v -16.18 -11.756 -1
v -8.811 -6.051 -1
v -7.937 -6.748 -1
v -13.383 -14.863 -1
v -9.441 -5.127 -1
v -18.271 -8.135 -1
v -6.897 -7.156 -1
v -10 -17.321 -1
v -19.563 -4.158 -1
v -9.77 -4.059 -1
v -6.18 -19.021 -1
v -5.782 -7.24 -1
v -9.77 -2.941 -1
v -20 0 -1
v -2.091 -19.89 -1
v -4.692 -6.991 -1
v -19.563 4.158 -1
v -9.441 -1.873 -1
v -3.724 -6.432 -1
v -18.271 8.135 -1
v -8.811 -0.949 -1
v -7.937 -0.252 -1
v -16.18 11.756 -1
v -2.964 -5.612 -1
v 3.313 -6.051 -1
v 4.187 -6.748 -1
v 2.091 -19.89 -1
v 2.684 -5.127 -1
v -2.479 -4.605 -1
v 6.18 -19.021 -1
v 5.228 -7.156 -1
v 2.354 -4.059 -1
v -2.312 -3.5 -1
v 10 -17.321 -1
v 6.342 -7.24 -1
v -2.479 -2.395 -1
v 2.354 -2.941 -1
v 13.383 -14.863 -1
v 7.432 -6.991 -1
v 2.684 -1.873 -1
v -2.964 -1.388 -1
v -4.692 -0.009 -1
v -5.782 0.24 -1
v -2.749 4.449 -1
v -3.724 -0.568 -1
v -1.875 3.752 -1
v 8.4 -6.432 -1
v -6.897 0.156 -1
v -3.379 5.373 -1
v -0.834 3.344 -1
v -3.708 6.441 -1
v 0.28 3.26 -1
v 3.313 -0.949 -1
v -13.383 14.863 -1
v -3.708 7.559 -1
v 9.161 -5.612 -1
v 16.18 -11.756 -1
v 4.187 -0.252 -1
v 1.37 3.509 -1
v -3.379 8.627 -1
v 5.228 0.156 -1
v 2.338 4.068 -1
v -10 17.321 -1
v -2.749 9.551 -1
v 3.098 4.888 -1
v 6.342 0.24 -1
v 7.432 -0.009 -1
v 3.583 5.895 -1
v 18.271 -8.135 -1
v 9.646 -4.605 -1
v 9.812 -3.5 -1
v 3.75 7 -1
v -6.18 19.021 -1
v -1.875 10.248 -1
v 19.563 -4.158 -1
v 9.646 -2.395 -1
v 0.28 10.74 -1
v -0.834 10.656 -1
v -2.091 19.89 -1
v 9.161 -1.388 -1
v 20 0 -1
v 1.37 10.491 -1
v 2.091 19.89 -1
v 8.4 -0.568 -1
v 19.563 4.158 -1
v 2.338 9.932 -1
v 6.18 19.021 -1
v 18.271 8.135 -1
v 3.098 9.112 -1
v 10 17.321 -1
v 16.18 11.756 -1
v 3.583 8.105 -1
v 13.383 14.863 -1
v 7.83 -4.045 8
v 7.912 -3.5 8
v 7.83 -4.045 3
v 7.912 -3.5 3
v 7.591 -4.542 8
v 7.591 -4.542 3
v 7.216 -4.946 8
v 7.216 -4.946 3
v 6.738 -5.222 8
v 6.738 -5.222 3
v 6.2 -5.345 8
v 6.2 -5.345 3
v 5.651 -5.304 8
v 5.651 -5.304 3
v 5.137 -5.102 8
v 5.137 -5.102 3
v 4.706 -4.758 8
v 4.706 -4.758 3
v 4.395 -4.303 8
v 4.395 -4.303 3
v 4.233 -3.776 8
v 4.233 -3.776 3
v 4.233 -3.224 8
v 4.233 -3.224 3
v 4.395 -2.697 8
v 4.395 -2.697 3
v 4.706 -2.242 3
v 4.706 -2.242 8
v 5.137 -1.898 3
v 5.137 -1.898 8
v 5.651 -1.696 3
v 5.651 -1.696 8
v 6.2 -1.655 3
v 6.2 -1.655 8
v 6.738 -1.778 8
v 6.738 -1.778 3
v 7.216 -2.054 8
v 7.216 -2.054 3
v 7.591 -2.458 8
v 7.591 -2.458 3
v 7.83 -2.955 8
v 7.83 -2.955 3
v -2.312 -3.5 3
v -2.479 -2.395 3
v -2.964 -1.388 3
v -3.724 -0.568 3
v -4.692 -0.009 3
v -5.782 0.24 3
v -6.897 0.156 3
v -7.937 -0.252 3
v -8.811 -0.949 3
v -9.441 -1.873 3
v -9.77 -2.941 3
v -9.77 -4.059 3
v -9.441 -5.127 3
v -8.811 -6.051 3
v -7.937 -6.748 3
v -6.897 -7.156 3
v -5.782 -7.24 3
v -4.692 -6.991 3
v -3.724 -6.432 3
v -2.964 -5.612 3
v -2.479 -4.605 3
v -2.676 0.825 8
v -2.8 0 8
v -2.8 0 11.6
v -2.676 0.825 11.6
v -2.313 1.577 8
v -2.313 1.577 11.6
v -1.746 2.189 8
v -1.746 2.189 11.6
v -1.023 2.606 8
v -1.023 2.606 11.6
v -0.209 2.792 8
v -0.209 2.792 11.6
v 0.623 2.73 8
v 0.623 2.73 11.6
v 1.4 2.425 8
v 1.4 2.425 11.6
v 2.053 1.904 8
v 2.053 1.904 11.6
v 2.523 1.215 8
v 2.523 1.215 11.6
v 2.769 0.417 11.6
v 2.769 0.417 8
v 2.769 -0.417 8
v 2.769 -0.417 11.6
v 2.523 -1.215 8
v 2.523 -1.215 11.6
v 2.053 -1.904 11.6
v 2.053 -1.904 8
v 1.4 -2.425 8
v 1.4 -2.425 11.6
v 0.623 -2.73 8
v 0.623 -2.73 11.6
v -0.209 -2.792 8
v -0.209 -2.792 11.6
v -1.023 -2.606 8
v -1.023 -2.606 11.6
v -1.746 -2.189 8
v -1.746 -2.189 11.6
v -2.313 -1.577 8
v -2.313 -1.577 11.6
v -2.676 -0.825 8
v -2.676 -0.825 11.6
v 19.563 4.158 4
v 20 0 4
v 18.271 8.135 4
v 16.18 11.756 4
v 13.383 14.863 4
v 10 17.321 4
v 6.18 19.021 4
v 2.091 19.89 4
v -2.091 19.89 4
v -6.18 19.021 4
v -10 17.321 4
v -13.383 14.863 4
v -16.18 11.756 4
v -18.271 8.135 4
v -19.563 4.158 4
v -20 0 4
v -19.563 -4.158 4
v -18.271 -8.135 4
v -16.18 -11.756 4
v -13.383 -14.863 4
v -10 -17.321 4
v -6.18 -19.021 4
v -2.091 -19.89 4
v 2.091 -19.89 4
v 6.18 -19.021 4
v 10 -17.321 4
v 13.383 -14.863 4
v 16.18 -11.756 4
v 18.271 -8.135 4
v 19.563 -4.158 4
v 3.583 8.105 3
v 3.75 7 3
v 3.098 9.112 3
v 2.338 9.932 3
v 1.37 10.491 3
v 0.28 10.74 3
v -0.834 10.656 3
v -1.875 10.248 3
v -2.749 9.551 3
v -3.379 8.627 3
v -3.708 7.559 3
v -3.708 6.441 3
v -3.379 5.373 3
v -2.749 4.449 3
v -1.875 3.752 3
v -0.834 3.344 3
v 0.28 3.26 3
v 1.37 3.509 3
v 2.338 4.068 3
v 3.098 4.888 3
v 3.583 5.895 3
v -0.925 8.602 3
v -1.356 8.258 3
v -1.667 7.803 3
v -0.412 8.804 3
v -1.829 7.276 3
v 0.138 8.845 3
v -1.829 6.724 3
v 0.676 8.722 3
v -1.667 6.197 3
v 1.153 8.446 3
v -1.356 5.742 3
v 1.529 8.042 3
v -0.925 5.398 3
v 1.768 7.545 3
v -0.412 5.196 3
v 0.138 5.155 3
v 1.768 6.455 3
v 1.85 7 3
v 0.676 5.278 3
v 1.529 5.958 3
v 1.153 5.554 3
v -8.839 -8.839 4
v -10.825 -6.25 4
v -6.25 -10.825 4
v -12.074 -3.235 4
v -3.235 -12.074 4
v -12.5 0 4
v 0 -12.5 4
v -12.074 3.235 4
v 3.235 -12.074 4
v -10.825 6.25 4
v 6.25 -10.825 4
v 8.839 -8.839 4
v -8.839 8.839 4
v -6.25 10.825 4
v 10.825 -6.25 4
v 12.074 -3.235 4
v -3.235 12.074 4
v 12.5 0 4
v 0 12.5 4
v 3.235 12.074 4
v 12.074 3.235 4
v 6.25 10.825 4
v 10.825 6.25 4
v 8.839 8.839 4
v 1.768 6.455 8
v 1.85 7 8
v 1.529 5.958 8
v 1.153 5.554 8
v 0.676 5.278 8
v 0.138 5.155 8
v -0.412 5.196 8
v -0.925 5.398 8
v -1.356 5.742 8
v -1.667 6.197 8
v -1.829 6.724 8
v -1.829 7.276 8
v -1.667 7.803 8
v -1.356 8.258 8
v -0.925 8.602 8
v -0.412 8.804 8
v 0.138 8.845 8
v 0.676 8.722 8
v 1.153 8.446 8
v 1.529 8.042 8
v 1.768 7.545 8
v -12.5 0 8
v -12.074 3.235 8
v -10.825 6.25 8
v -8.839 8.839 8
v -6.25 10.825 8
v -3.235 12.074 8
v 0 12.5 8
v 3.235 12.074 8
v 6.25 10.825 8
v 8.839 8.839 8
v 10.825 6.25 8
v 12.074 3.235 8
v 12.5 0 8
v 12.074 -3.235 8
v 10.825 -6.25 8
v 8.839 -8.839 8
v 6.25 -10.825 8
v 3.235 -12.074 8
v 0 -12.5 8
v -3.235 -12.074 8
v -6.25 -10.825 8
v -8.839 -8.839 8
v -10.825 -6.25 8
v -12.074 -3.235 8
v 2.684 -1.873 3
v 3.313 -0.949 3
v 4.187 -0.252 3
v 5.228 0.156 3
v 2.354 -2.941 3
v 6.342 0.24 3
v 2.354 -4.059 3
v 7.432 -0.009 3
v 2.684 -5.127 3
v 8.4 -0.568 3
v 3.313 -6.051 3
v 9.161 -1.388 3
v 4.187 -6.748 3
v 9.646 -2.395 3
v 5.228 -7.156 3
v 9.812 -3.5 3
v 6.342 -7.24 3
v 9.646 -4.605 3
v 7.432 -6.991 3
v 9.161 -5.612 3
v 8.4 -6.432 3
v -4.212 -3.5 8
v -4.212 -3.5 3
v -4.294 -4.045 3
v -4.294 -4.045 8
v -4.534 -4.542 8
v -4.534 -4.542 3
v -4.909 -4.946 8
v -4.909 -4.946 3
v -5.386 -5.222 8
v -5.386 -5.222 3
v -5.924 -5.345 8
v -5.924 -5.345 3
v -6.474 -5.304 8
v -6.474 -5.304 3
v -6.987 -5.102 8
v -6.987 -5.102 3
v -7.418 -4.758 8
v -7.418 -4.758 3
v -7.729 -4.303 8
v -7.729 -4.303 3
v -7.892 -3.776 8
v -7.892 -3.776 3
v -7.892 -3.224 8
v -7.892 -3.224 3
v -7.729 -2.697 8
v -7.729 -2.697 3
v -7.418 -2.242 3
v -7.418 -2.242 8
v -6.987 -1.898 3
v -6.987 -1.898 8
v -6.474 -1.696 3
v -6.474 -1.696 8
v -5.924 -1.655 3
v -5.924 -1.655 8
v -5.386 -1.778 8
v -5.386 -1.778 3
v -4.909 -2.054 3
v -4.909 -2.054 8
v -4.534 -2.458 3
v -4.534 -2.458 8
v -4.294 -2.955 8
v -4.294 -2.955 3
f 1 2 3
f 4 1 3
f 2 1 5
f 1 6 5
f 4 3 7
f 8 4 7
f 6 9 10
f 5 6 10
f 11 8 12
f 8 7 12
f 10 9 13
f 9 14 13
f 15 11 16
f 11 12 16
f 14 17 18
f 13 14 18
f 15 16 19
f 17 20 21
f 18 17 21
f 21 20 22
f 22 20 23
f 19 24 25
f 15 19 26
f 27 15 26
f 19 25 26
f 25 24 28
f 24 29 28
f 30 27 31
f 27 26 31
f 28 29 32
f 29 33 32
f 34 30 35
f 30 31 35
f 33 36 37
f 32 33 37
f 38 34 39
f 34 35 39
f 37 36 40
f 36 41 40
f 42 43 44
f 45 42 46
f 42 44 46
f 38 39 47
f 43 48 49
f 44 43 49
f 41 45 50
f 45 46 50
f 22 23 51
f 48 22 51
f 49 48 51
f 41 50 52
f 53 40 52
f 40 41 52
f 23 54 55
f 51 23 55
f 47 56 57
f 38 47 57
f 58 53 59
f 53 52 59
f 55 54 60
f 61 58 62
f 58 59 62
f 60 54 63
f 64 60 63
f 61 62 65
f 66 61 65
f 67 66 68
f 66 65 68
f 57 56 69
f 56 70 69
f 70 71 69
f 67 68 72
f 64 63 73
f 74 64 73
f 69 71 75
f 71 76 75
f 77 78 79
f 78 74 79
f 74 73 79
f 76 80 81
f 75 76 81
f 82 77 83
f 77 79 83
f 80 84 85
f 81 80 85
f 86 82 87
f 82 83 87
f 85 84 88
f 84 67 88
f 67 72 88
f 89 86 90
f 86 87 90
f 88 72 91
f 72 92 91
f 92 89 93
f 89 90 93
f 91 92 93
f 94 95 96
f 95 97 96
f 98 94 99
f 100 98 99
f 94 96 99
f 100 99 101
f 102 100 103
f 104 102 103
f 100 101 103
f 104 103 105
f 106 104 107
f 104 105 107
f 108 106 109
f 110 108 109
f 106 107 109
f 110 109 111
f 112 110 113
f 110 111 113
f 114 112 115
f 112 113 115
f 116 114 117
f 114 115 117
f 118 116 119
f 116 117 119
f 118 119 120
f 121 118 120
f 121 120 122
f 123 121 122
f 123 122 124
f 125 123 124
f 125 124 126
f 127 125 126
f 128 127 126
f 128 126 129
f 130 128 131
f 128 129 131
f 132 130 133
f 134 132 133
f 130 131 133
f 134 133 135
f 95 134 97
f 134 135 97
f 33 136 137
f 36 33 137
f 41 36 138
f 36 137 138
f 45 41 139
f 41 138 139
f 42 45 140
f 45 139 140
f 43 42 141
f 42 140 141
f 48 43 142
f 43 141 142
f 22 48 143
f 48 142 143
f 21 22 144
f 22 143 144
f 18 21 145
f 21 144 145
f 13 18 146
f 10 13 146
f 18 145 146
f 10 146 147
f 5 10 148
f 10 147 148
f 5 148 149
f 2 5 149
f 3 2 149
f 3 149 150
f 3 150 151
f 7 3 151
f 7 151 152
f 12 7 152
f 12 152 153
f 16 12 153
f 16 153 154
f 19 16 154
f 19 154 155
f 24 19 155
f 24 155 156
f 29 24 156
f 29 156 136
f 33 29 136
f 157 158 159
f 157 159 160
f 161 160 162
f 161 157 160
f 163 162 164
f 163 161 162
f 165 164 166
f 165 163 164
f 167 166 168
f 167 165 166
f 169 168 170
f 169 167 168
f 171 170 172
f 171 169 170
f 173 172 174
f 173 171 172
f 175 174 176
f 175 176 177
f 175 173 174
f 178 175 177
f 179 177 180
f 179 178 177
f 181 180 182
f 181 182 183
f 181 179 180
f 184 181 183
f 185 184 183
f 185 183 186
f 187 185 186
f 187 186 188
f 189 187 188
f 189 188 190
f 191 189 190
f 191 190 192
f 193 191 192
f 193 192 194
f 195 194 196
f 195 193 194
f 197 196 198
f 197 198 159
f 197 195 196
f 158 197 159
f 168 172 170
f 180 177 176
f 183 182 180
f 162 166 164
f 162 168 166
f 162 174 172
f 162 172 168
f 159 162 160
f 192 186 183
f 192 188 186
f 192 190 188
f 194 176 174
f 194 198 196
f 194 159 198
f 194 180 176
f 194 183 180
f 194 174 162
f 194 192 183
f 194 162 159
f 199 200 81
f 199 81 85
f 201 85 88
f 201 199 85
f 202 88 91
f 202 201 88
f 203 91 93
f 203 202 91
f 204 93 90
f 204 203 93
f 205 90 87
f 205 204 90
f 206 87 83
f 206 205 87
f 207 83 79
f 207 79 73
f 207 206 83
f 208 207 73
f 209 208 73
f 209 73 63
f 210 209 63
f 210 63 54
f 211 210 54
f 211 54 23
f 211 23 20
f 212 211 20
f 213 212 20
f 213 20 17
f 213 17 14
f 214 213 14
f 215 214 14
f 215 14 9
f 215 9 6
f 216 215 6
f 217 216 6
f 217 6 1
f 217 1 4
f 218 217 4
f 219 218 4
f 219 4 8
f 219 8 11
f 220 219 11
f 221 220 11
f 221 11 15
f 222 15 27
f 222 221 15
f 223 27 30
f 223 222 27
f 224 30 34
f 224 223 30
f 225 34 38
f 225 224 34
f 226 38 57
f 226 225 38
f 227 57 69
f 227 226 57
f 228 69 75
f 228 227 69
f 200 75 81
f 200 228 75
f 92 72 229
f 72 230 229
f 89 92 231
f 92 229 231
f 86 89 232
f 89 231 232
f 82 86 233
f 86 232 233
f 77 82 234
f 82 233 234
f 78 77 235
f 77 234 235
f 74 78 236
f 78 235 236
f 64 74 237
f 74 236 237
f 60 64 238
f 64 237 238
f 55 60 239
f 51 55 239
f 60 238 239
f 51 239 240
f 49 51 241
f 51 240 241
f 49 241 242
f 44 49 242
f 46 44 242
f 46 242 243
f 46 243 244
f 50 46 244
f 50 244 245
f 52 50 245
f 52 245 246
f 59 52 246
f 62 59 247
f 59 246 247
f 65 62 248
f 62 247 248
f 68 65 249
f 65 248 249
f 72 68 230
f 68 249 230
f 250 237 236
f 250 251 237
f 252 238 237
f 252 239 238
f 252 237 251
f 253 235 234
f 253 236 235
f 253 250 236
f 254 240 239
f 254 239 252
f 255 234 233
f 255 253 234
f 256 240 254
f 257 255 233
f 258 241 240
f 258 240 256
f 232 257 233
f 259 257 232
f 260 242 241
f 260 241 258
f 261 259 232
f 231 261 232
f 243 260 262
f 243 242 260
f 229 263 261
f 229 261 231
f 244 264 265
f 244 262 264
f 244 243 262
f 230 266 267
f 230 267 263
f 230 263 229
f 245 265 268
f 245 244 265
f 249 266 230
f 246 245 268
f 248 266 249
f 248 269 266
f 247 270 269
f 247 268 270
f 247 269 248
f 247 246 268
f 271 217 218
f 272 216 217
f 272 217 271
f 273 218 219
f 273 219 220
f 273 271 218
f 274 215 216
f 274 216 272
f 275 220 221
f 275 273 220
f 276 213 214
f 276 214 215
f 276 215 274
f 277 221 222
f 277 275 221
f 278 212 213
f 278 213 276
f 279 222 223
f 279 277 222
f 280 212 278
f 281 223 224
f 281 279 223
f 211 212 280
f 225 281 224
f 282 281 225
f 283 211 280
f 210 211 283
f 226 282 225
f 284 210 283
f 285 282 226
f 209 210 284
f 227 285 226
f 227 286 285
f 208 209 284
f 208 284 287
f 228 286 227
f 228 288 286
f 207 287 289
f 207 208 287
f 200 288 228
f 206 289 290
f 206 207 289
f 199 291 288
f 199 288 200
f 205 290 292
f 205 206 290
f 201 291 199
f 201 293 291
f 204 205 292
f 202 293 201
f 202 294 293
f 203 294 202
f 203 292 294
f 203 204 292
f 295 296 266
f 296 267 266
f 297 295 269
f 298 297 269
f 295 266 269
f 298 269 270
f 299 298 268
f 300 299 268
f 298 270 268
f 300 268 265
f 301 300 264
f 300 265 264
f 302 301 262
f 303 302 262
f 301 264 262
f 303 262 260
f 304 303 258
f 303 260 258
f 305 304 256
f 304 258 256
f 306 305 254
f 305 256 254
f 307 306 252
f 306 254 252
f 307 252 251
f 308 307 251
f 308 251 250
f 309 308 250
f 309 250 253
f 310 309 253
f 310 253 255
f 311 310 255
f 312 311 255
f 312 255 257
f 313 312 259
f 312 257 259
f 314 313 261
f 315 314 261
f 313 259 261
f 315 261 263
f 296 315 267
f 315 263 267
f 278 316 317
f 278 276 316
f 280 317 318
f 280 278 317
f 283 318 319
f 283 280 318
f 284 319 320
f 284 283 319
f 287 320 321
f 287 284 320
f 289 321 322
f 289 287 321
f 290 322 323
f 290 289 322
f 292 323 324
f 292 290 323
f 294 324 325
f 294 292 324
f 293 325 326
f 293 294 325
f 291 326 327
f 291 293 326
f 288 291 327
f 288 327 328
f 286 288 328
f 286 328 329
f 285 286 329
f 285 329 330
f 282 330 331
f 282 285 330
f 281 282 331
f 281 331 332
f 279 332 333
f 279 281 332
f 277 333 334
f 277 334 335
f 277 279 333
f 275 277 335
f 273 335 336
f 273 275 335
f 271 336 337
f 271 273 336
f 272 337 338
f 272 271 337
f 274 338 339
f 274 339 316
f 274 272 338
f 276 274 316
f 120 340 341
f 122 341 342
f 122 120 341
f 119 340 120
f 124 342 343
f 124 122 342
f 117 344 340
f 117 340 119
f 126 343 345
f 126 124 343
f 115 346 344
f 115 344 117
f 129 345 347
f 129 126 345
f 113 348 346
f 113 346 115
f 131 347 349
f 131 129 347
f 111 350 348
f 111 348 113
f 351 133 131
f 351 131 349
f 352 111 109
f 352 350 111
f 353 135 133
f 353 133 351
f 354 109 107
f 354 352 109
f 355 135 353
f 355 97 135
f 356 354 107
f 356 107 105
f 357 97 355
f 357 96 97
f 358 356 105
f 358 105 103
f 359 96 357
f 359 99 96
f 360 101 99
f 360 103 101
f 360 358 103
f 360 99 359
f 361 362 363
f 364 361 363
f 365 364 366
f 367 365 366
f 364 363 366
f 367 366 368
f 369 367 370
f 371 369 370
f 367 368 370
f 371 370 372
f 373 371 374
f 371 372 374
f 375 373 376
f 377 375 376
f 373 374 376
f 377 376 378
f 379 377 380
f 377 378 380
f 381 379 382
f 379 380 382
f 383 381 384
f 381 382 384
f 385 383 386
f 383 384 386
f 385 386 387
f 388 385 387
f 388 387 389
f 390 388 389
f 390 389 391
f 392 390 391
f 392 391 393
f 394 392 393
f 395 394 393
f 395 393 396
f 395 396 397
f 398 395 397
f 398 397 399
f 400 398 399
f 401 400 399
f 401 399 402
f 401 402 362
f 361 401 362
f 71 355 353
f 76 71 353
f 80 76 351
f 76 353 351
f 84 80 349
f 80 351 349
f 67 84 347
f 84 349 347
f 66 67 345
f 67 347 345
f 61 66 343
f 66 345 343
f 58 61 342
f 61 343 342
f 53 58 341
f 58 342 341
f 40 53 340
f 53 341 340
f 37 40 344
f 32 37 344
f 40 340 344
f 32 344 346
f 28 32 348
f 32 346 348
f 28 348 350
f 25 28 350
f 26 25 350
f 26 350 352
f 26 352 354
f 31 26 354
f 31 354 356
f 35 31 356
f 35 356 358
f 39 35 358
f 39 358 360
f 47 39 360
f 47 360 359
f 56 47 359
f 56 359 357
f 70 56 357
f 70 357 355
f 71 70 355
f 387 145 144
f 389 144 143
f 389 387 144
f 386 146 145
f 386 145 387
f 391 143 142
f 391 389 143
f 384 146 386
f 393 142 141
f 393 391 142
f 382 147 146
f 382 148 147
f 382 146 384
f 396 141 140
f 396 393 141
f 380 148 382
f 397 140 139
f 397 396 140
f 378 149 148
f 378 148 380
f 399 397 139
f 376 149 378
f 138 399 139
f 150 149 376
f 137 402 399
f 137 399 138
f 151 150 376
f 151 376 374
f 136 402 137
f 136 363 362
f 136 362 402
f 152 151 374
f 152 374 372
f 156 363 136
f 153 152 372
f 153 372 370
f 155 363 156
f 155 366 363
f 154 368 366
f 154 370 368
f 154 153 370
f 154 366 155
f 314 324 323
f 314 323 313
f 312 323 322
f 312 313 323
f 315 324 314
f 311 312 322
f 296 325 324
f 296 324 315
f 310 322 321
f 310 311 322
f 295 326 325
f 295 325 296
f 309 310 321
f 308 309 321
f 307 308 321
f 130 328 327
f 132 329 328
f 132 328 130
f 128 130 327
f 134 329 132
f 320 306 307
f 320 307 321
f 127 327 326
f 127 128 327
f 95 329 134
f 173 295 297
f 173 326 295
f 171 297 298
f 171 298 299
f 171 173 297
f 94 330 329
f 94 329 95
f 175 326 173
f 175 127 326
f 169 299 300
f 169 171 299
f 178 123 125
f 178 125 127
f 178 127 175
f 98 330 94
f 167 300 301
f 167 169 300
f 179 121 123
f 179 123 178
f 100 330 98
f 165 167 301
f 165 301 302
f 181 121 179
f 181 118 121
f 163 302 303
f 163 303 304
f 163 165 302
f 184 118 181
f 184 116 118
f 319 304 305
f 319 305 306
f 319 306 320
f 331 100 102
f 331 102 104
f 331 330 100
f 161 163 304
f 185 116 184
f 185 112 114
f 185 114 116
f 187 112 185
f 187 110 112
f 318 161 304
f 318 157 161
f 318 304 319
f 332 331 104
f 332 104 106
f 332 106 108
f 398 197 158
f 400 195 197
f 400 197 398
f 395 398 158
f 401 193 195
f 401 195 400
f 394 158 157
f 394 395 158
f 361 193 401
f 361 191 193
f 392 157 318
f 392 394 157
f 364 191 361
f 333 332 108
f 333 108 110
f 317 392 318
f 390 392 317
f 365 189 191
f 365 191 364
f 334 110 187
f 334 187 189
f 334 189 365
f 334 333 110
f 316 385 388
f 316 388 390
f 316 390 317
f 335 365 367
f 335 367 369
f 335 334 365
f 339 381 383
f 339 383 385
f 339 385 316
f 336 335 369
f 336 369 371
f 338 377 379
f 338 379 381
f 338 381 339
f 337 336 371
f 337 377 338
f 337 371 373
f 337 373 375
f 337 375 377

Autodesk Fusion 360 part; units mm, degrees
sketch "Boceto9" plane through (0, 0, 0) normal (0, 0, 1) x (1, 0, 0)
  circle A0 centre (0, 0) radius 15
  dimension "d28" = 30
extrude "Extruir9" add sketch "Boceto9" along normal blind 4
sketch "Boceto10" plane through (0, 0, 4) normal (0, 0, 1) x (-1, 0, 0)
  circle A0 centre (0, 0) radius 15
  circle A1 centre (0, 0) radius 12.5
  dimension "d31" = 25
extrude "Extruir10" add sketch "Boceto10" along normal blind 4 contours A1
sketch "Boceto11" plane through (0, 0, 0) normal (0, 0, -1) x (1, 0, 0)
  circle A0 centre (0, 0) radius 15
  circle A1 centre (0, 0) radius 12.5
  circle A2 centre (0, 0) radius 7
  line L0 (0, 0) -> (-6.0622, 3.5)
  line L1 (0, 0) -> (7, 0) construction
  line L2 (0, 0) -> (6.0622, 3.5)
  line L3 (0, 0) -> (7, 0) construction
  line L4 (0, 0) -> (0, -7)
  circle A3 centre (6.0622, 3.5) radius 3.75
  circle A4 centre (-6.0622, 3.5) radius 3.75
  circle A5 centre (0, -7) radius 3.75
  circle A6 centre (6.0622, 3.5) radius 2
  circle A7 centre (-6.0622, 3.5) radius 2
  circle A8 centre (0, -7) radius 2
  dimension "d34" = 25
  dimension "d35" = 14
  dimension "d36" = 150
  dimension "d37" = 30
  dimension "d38" = 7
  dimension "d39" = 7.5
  dimension "d40" = 7.5
  dimension "d41" = 7.5
  dimension "d42" = 4
  dimension "d43" = 4
  dimension "d44" = 4
extrude "Extruir11" cut sketch "Boceto11" against normal blind 3 contours A2 L2 A3 A6 | A2 A3 A6 | A2 L2 A6 | A2 A6 | A2 L2 A6 | A2 L2 A3 A6 | A2 A5 A8 | A2 L4 A5 A8 | A2 A8 | A2 L4 A8 | A2 L4 A5 A8 | A2 L4 A8 | A2 L0 A4 A7 | A2 L0 A4 A7 | A2 A4 A7 | A2 L0 A7 | A2 L0 A7 | A2 A7
extrude "Extruir12" add 1 faces at (-0.3737, -9.0198, 0) along direction (0, 0, -1) blind 1
extrude "Extruir13" cut sketch "Boceto11" against normal blind 20 contours A2 L2 A6 | A2 A6 | A2 L2 A6 | A2 A8 | A2 L4 A8 | A2 L4 A8 | A2 L0 A7 | A2 L0 A7 | A2 A7
sketch "Boceto12" plane through (0, 0, 8) normal (0, 0, 1) x (-1, 0, 0)
  circle A0 centre (-6.0622, 3.5) radius 2
  circle A1 centre (6.0622, 3.5) radius 2
  circle A2 centre (0, -7) radius 2
  circle A3 centre (0, 0) radius 12.5
  circle A4 centre (0, 0) radius 2.8
  dimension "d51" = 5.6
extrude "Extruir14" add sketch "Boceto12" along normal blind 3.6 contours A4
move_face "CarasDesfase2" offset 0.15 3 faces at (-4.0721, -3.3009, 4.6667) (8.0522, -3.3009, 4.6667) (1.9901, 7.1991, 4.6667)
move_face "CarasDesfase3" offset 3 1 faces at (14.9814, -0.7477, 0.6667)
move_face "CarasDesfase4" offset 2 1 faces at (17.9776, -0.8972, 0.6667)
